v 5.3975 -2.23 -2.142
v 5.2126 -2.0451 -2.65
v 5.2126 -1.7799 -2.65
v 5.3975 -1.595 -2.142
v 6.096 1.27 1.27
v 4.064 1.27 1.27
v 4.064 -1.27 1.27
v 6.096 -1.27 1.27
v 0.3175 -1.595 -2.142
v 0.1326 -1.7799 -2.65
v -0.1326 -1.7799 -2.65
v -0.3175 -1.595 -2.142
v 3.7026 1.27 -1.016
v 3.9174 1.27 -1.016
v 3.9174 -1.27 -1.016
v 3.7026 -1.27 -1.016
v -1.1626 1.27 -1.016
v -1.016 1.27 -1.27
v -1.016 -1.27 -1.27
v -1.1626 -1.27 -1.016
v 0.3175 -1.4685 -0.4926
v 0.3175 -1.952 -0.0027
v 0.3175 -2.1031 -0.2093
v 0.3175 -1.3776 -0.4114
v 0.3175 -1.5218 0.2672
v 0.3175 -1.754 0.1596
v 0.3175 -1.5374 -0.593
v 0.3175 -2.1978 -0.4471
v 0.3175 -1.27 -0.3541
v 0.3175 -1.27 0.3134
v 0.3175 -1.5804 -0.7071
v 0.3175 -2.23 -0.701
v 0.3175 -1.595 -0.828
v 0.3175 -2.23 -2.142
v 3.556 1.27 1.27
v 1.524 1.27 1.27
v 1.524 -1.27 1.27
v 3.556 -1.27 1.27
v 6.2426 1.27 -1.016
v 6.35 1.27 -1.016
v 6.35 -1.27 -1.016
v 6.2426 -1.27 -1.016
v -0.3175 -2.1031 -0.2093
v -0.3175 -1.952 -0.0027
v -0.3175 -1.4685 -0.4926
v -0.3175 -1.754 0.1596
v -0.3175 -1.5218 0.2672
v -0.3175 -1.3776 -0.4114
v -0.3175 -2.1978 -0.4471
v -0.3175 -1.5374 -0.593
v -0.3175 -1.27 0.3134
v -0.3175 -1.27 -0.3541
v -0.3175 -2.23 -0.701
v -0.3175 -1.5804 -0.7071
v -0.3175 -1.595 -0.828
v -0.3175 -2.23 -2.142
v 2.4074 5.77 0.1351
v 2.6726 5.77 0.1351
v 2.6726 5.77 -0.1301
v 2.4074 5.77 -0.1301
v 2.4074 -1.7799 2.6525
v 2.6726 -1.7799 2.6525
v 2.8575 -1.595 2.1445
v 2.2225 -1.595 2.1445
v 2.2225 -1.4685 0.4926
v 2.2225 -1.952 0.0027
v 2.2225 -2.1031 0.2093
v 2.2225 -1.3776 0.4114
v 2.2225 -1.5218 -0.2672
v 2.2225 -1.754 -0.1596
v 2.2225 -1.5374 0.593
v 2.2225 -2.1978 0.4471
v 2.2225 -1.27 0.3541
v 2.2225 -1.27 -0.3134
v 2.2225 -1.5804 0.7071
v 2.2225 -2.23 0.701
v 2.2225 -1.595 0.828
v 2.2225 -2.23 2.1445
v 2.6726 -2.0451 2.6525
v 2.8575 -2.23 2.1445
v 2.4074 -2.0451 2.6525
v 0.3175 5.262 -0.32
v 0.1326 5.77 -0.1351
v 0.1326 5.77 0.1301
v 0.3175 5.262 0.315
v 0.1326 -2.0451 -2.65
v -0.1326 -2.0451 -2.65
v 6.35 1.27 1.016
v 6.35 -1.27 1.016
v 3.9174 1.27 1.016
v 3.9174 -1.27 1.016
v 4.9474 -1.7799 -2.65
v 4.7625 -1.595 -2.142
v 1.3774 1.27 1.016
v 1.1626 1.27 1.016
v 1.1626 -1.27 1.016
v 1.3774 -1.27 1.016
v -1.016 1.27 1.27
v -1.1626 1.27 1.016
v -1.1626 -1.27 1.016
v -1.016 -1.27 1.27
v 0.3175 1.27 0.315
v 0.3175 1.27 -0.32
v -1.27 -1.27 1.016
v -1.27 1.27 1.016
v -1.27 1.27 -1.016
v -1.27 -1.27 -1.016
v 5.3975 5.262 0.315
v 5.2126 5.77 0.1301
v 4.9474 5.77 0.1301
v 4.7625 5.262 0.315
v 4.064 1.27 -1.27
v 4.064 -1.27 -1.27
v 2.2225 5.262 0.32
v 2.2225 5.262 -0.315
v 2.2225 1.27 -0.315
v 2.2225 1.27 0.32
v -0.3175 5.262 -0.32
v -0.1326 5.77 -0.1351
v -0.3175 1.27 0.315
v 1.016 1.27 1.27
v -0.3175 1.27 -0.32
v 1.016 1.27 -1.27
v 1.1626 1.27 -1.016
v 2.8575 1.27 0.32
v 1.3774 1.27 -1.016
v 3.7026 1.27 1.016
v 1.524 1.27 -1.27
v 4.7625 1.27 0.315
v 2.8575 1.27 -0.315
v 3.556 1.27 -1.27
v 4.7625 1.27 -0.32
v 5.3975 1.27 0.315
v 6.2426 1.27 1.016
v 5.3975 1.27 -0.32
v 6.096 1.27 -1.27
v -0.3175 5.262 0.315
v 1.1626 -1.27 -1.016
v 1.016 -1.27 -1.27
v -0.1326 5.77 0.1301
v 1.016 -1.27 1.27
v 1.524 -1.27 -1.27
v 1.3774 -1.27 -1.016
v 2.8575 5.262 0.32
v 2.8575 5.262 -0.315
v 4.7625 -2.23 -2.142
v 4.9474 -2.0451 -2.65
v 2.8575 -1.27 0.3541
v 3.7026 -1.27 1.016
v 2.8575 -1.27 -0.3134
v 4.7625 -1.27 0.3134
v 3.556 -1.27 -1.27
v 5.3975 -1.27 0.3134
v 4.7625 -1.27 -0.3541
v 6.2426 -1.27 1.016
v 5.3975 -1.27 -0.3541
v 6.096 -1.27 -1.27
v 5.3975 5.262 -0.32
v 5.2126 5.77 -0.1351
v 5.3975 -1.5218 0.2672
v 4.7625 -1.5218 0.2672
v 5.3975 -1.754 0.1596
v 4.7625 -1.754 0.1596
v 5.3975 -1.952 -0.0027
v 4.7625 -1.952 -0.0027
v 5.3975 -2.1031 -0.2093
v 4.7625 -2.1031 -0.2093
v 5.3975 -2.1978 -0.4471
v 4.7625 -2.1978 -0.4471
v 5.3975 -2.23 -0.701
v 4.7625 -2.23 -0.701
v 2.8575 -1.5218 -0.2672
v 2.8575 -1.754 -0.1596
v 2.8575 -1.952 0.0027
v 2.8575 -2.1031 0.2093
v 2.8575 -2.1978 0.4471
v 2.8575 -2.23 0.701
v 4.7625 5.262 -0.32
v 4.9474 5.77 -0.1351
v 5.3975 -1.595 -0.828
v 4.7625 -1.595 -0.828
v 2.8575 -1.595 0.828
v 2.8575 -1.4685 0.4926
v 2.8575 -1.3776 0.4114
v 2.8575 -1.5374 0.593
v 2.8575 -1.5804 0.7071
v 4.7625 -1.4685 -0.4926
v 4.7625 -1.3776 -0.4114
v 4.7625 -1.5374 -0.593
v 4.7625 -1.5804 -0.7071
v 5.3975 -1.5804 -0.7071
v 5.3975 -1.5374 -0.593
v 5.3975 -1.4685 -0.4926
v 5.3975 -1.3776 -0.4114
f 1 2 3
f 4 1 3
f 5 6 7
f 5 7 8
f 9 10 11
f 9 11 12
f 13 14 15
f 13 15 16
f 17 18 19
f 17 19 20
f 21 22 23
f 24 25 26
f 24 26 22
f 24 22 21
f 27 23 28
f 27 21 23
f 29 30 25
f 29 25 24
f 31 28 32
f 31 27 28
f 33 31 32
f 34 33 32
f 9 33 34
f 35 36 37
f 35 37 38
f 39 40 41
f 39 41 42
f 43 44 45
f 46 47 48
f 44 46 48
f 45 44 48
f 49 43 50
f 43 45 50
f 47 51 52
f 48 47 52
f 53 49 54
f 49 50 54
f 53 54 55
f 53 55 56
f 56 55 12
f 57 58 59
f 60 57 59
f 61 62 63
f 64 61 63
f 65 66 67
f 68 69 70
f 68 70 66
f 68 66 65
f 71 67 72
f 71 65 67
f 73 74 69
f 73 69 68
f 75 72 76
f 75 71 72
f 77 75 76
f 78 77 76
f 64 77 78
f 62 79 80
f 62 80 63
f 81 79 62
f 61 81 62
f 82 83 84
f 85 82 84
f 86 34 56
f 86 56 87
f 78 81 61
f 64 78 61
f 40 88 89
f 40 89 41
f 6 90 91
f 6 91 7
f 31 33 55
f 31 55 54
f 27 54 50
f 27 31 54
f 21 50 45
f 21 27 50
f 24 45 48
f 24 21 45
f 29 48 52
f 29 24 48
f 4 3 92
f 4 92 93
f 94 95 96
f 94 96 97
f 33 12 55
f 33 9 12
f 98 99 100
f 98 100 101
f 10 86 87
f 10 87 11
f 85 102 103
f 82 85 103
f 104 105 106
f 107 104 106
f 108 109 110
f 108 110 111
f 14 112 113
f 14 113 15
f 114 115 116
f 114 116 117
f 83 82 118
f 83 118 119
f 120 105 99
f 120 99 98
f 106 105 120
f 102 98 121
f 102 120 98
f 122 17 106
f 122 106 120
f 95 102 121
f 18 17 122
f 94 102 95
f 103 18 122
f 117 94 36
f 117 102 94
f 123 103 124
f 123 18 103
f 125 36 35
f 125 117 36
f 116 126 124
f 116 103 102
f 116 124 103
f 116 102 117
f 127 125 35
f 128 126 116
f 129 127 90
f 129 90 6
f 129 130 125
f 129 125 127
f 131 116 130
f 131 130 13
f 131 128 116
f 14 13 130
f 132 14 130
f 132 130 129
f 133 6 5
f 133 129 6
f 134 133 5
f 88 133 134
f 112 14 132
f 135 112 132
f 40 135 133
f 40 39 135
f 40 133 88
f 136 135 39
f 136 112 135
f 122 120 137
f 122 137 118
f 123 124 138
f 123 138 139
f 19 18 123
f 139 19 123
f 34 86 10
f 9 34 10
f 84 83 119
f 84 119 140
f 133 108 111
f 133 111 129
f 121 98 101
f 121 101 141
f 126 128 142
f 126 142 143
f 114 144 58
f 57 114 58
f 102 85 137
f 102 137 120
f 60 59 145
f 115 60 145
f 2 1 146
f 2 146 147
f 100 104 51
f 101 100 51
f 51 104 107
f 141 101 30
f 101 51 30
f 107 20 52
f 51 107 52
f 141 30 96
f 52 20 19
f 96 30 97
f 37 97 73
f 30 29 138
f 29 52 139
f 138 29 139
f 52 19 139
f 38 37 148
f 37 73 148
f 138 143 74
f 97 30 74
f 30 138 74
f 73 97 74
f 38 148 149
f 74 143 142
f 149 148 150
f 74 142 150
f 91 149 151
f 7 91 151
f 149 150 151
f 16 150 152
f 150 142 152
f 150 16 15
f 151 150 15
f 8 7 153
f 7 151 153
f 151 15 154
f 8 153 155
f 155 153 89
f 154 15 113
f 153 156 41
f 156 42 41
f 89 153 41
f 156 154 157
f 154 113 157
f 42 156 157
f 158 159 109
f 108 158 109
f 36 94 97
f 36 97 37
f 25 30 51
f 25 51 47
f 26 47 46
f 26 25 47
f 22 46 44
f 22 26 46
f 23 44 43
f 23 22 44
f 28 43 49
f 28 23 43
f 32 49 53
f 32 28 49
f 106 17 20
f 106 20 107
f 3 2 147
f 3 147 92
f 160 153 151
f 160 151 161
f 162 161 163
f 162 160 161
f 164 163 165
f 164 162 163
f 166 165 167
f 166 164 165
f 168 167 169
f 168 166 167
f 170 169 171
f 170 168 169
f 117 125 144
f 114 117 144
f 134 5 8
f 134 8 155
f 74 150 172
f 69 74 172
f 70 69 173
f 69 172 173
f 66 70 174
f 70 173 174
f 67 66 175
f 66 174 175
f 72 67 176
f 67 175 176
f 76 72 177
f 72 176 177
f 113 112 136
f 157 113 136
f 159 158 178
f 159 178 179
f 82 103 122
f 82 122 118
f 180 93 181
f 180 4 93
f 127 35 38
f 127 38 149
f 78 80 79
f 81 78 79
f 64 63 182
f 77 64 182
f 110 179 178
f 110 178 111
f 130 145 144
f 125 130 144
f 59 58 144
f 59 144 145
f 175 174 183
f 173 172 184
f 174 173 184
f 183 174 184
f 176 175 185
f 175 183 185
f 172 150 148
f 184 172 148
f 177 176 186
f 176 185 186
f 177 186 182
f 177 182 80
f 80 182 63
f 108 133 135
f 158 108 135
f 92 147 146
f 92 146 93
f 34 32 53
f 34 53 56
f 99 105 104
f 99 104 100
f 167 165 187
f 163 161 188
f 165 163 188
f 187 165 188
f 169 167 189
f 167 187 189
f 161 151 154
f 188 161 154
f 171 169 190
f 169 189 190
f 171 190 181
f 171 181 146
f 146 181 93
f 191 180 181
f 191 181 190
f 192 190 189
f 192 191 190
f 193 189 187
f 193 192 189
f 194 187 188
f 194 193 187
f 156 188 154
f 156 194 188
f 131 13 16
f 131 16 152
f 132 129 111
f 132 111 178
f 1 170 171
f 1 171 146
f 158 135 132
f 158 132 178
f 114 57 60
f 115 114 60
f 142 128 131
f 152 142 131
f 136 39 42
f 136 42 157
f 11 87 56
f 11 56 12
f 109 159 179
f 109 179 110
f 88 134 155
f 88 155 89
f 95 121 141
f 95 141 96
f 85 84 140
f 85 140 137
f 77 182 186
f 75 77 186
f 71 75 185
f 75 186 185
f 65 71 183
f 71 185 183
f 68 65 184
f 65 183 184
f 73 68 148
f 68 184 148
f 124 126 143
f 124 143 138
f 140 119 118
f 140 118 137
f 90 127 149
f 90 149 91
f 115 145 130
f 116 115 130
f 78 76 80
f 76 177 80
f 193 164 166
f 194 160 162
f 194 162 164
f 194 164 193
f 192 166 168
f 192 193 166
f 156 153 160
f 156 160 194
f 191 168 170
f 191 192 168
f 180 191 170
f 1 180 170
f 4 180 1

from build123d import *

# Parameters (mm, degrees)
SKETCH1_W                            = 15.24
SKETCH1_H                            = 2.54
BASE_EXTRUDE_DEPTH                   = 1.27
PIN_DEPTH                            = 0.3175
PIN_CHAMFER_SIZE2                    = 0.184896879
PIN_CHAMFER_SIZE                     = 0.508
PIN_PATTERN_COUNT                    = 3
PIN_PATTERN_PITCH                    = 5.08
PIN_CHAMFER_OF_PIN_PATTERN_SIZE2     = 0.184896879
PIN_CHAMFER_OF_PIN_PATTERN_SIZE      = 0.508
PIN_2_DEPTH                          = 0.3175
PIN_2_CHAMFER_SIZE2                  = 0.184896879
PIN_2_CHAMFER_SIZE                   = 0.508
PIN_2_PATTERN_COUNT                  = 3
PIN_2_PATTERN_PITCH                  = 5.08
PIN_2_CHAMFER_OF_PIN_2_PATTERN_SIZE2 = 0.184896879
PIN_2_CHAMFER_OF_PIN_2_PATTERN_SIZE  = 0.508
SV_CUT_DEPTH                         = 4.5
SV_CUT_PATTERN_COUNT                 = 5
SV_CUT_PATTERN_PITCH                 = 2.54
LPATTERN1_COUNT                      = 3
LPATTERN1_PITCH                      = 2.54
SKETCH16_W                           = 7.62
SKETCH16_H                           = 5.30254
CUT_EXTRUDE1_DEPTH                   = 9


with BuildPart() as part:
    # Sketch1 → Base Extrude (new body, symmetric)
    with BuildSketch(Plane(origin=(0, 0, 0), x_dir=(1, 0, 0), z_dir=(0, 1, 0))):
        with Locations((6.35, 0)):
            Rectangle(SKETCH1_W, SKETCH1_H)
    extrude(amount=BASE_EXTRUDE_DEPTH, both=True)

    # Sketch8 → Pin (add, symmetric)
    with BuildSketch(Plane(origin=(0, 0, 0), x_dir=(0, 0, -1), z_dir=(1, 0, 0))):
        with BuildLine():
            Line((0.32004, -1.087), (0.32004, 5.262))
            Line((0.32004, 5.262), (0.135143121, 5.77))
            Line((0.135143121, 5.77), (-0.130063121, 5.77))
            Line((-0.130063121, 5.77), (-0.31496, 5.262))
            Line((-0.31496, 5.262), (-0.31496, -1.214))
            ThreePointArc((-0.31496, -1.214), (-0.01738049, -1.93242049), (0.70104, -2.23))
            Line((0.70104, -2.23), (2.142, -2.23))
            Line((2.142, -2.23), (2.65, -2.045103121))
            Line((2.65, -2.045103121), (2.65, -1.779896879))
            Line((2.65, -1.779896879), (2.142, -1.595))
            Line((2.142, -1.595), (0.82804, -1.595))
            ThreePointArc((0.82804, -1.595), (0.468829755, -1.446210245), (0.32004, -1.087))
        make_face()
    pin = extrude(amount=PIN_DEPTH, both=True)

    # Pin Chamfer
    pin_chamfer_edges = [part.edges().sort_by_distance(p)[0] for p in [
        (0.3175, -1.9125, -2.65),
        (-0.3175, 5.77, -0.00254),
        (-0.3175, -1.9125, -2.65),
        (0.3175, 5.77, -0.00254),
    ]]
    chamfer(pin_chamfer_edges, length=PIN_CHAMFER_SIZE, length2=PIN_CHAMFER_SIZE2)

    # Pin Pattern: Pin ×3
    with Locations(*[(i * PIN_PATTERN_PITCH, 0, 0) for i in range(1, PIN_PATTERN_COUNT)]):
        add(pin)

    # Pin Chamfer of Pin Pattern
    pin_chamfer_of_pin_pattern_edges = [part.edges().sort_by_distance(p)[0] for p in [
        (5.3975, -1.9125, -2.65),
        (4.7625, 5.77, -0.00254),
        (4.7625, -1.9125, -2.65),
        (5.3975, 5.77, -0.00254),
        (10.4775, -1.9125, -2.65),
        (9.8425, 5.77, -0.00254),
        (9.8425, -1.9125, -2.65),
        (10.4775, 5.77, -0.00254),
    ]]
    chamfer(pin_chamfer_of_pin_pattern_edges, length=PIN_CHAMFER_OF_PIN_PATTERN_SIZE, length2=PIN_CHAMFER_OF_PIN_PATTERN_SIZE2)

    # Sketch9 → Pin 2 (add, symmetric)
    with BuildSketch(Plane(origin=(2.54, 0, 0), x_dir=(0, 0, -1), z_dir=(1, 0, 0))):
        with BuildLine():
            Line((-0.32004, -1.087), (-0.32004, 5.262))
            Line((-0.32004, 5.262), (-0.135143121, 5.77))
            Line((-0.135143121, 5.77), (0.130063121, 5.77))
            Line((0.130063121, 5.77), (0.31496, 5.262))
            Line((0.31496, 5.262), (0.31496, -1.214))
            ThreePointArc((0.31496, -1.214), (0.01738049, -1.93242049), (-0.70104, -2.23))
            Line((-0.70104, -2.23), (-2.14454, -2.23))
            Line((-2.14454, -2.23), (-2.65254, -2.045103121))
            Line((-2.65254, -2.045103121), (-2.65254, -1.779896879))
            Line((-2.65254, -1.779896879), (-2.14454, -1.595))
            Line((-2.14454, -1.595), (-0.82804, -1.595))
            ThreePointArc((-0.82804, -1.595), (-0.468829755, -1.446210245), (-0.32004, -1.087))
        make_face()
    pin_2 = extrude(amount=PIN_2_DEPTH, both=True)

    # Pin 2 Chamfer
    pin_2_chamfer_edges = [part.edges().sort_by_distance(p)[0] for p in [
        (2.8575, -1.9125, 2.65254),
        (2.2225, -1.9125, 2.65254),
        (2.2225, 5.77, 0.00254),
        (2.8575, 5.77, 0.00254),
    ]]
    chamfer(pin_2_chamfer_edges, length=PIN_2_CHAMFER_SIZE, length2=PIN_2_CHAMFER_SIZE2)

    # Pin 2 Pattern: Pin 2 ×3
    with Locations(*[(i * PIN_2_PATTERN_PITCH, 0, 0) for i in range(1, PIN_2_PATTERN_COUNT)]):
        add(pin_2)

    # Pin 2 Chamfer of Pin 2 Pattern
    pin_2_chamfer_of_pin_2_pattern_edges = [part.edges().sort_by_distance(p)[0] for p in [
        (7.9375, -1.9125, 2.65254),
        (7.3025, -1.9125, 2.65254),
        (7.3025, 5.77, 0.00254),
        (7.9375, 5.77, 0.00254),
        (13.0175, -1.9125, 2.65254),
        (12.3825, -1.9125, 2.65254),
        (12.3825, 5.77, 0.00254),
        (13.0175, 5.77, 0.00254),
    ]]
    chamfer(pin_2_chamfer_of_pin_2_pattern_edges, length=PIN_2_CHAMFER_OF_PIN_2_PATTERN_SIZE, length2=PIN_2_CHAMFER_OF_PIN_2_PATTERN_SIZE2)

    # Sketch15 → SV Cut (cut, through all)
    with BuildSketch(Plane(origin=(0, 1.27, 0), x_dir=(-1, 0, 0), z_dir=(0, 1, 0))):
        Polygon((-3.556, 1.27), (-3.702646976, 1.016), (-3.917353024, 1.016), (-4.064, 1.27), align=None)
        Polygon((-4.064, -1.27), (-3.917353024, -1.016), (-3.702646976, -1.016), (-3.556, -1.27), align=None)
    sv_cut = extrude(amount=-SV_CUT_DEPTH, mode=Mode.SUBTRACT)

    # SV Cut Pattern: SV Cut ×5
    with Locations(*[(i * SV_CUT_PATTERN_PITCH, 0, 0) for i in range(1, SV_CUT_PATTERN_COUNT)]):
        add(sv_cut, mode=Mode.SUBTRACT)

    # LPattern1: SV Cut ×3
    with Locations(*[(-i * LPATTERN1_PITCH, 0, 0) for i in range(1, LPATTERN1_COUNT)]):
        add(sv_cut, mode=Mode.SUBTRACT)

    # Sketch16 → Cut-Extrude1 (cut, through all)
    with BuildSketch(Plane(origin=(0, 5.77, 0), x_dir=(1, 0, 0), z_dir=(0, 1, 0))):
        with Locations((10.16, -0.00127)):
            Rectangle(SKETCH16_W, SKETCH16_H)
    extrude(amount=-CUT_EXTRUDE1_DEPTH, mode=Mode.SUBTRACT)


solid = part.part
